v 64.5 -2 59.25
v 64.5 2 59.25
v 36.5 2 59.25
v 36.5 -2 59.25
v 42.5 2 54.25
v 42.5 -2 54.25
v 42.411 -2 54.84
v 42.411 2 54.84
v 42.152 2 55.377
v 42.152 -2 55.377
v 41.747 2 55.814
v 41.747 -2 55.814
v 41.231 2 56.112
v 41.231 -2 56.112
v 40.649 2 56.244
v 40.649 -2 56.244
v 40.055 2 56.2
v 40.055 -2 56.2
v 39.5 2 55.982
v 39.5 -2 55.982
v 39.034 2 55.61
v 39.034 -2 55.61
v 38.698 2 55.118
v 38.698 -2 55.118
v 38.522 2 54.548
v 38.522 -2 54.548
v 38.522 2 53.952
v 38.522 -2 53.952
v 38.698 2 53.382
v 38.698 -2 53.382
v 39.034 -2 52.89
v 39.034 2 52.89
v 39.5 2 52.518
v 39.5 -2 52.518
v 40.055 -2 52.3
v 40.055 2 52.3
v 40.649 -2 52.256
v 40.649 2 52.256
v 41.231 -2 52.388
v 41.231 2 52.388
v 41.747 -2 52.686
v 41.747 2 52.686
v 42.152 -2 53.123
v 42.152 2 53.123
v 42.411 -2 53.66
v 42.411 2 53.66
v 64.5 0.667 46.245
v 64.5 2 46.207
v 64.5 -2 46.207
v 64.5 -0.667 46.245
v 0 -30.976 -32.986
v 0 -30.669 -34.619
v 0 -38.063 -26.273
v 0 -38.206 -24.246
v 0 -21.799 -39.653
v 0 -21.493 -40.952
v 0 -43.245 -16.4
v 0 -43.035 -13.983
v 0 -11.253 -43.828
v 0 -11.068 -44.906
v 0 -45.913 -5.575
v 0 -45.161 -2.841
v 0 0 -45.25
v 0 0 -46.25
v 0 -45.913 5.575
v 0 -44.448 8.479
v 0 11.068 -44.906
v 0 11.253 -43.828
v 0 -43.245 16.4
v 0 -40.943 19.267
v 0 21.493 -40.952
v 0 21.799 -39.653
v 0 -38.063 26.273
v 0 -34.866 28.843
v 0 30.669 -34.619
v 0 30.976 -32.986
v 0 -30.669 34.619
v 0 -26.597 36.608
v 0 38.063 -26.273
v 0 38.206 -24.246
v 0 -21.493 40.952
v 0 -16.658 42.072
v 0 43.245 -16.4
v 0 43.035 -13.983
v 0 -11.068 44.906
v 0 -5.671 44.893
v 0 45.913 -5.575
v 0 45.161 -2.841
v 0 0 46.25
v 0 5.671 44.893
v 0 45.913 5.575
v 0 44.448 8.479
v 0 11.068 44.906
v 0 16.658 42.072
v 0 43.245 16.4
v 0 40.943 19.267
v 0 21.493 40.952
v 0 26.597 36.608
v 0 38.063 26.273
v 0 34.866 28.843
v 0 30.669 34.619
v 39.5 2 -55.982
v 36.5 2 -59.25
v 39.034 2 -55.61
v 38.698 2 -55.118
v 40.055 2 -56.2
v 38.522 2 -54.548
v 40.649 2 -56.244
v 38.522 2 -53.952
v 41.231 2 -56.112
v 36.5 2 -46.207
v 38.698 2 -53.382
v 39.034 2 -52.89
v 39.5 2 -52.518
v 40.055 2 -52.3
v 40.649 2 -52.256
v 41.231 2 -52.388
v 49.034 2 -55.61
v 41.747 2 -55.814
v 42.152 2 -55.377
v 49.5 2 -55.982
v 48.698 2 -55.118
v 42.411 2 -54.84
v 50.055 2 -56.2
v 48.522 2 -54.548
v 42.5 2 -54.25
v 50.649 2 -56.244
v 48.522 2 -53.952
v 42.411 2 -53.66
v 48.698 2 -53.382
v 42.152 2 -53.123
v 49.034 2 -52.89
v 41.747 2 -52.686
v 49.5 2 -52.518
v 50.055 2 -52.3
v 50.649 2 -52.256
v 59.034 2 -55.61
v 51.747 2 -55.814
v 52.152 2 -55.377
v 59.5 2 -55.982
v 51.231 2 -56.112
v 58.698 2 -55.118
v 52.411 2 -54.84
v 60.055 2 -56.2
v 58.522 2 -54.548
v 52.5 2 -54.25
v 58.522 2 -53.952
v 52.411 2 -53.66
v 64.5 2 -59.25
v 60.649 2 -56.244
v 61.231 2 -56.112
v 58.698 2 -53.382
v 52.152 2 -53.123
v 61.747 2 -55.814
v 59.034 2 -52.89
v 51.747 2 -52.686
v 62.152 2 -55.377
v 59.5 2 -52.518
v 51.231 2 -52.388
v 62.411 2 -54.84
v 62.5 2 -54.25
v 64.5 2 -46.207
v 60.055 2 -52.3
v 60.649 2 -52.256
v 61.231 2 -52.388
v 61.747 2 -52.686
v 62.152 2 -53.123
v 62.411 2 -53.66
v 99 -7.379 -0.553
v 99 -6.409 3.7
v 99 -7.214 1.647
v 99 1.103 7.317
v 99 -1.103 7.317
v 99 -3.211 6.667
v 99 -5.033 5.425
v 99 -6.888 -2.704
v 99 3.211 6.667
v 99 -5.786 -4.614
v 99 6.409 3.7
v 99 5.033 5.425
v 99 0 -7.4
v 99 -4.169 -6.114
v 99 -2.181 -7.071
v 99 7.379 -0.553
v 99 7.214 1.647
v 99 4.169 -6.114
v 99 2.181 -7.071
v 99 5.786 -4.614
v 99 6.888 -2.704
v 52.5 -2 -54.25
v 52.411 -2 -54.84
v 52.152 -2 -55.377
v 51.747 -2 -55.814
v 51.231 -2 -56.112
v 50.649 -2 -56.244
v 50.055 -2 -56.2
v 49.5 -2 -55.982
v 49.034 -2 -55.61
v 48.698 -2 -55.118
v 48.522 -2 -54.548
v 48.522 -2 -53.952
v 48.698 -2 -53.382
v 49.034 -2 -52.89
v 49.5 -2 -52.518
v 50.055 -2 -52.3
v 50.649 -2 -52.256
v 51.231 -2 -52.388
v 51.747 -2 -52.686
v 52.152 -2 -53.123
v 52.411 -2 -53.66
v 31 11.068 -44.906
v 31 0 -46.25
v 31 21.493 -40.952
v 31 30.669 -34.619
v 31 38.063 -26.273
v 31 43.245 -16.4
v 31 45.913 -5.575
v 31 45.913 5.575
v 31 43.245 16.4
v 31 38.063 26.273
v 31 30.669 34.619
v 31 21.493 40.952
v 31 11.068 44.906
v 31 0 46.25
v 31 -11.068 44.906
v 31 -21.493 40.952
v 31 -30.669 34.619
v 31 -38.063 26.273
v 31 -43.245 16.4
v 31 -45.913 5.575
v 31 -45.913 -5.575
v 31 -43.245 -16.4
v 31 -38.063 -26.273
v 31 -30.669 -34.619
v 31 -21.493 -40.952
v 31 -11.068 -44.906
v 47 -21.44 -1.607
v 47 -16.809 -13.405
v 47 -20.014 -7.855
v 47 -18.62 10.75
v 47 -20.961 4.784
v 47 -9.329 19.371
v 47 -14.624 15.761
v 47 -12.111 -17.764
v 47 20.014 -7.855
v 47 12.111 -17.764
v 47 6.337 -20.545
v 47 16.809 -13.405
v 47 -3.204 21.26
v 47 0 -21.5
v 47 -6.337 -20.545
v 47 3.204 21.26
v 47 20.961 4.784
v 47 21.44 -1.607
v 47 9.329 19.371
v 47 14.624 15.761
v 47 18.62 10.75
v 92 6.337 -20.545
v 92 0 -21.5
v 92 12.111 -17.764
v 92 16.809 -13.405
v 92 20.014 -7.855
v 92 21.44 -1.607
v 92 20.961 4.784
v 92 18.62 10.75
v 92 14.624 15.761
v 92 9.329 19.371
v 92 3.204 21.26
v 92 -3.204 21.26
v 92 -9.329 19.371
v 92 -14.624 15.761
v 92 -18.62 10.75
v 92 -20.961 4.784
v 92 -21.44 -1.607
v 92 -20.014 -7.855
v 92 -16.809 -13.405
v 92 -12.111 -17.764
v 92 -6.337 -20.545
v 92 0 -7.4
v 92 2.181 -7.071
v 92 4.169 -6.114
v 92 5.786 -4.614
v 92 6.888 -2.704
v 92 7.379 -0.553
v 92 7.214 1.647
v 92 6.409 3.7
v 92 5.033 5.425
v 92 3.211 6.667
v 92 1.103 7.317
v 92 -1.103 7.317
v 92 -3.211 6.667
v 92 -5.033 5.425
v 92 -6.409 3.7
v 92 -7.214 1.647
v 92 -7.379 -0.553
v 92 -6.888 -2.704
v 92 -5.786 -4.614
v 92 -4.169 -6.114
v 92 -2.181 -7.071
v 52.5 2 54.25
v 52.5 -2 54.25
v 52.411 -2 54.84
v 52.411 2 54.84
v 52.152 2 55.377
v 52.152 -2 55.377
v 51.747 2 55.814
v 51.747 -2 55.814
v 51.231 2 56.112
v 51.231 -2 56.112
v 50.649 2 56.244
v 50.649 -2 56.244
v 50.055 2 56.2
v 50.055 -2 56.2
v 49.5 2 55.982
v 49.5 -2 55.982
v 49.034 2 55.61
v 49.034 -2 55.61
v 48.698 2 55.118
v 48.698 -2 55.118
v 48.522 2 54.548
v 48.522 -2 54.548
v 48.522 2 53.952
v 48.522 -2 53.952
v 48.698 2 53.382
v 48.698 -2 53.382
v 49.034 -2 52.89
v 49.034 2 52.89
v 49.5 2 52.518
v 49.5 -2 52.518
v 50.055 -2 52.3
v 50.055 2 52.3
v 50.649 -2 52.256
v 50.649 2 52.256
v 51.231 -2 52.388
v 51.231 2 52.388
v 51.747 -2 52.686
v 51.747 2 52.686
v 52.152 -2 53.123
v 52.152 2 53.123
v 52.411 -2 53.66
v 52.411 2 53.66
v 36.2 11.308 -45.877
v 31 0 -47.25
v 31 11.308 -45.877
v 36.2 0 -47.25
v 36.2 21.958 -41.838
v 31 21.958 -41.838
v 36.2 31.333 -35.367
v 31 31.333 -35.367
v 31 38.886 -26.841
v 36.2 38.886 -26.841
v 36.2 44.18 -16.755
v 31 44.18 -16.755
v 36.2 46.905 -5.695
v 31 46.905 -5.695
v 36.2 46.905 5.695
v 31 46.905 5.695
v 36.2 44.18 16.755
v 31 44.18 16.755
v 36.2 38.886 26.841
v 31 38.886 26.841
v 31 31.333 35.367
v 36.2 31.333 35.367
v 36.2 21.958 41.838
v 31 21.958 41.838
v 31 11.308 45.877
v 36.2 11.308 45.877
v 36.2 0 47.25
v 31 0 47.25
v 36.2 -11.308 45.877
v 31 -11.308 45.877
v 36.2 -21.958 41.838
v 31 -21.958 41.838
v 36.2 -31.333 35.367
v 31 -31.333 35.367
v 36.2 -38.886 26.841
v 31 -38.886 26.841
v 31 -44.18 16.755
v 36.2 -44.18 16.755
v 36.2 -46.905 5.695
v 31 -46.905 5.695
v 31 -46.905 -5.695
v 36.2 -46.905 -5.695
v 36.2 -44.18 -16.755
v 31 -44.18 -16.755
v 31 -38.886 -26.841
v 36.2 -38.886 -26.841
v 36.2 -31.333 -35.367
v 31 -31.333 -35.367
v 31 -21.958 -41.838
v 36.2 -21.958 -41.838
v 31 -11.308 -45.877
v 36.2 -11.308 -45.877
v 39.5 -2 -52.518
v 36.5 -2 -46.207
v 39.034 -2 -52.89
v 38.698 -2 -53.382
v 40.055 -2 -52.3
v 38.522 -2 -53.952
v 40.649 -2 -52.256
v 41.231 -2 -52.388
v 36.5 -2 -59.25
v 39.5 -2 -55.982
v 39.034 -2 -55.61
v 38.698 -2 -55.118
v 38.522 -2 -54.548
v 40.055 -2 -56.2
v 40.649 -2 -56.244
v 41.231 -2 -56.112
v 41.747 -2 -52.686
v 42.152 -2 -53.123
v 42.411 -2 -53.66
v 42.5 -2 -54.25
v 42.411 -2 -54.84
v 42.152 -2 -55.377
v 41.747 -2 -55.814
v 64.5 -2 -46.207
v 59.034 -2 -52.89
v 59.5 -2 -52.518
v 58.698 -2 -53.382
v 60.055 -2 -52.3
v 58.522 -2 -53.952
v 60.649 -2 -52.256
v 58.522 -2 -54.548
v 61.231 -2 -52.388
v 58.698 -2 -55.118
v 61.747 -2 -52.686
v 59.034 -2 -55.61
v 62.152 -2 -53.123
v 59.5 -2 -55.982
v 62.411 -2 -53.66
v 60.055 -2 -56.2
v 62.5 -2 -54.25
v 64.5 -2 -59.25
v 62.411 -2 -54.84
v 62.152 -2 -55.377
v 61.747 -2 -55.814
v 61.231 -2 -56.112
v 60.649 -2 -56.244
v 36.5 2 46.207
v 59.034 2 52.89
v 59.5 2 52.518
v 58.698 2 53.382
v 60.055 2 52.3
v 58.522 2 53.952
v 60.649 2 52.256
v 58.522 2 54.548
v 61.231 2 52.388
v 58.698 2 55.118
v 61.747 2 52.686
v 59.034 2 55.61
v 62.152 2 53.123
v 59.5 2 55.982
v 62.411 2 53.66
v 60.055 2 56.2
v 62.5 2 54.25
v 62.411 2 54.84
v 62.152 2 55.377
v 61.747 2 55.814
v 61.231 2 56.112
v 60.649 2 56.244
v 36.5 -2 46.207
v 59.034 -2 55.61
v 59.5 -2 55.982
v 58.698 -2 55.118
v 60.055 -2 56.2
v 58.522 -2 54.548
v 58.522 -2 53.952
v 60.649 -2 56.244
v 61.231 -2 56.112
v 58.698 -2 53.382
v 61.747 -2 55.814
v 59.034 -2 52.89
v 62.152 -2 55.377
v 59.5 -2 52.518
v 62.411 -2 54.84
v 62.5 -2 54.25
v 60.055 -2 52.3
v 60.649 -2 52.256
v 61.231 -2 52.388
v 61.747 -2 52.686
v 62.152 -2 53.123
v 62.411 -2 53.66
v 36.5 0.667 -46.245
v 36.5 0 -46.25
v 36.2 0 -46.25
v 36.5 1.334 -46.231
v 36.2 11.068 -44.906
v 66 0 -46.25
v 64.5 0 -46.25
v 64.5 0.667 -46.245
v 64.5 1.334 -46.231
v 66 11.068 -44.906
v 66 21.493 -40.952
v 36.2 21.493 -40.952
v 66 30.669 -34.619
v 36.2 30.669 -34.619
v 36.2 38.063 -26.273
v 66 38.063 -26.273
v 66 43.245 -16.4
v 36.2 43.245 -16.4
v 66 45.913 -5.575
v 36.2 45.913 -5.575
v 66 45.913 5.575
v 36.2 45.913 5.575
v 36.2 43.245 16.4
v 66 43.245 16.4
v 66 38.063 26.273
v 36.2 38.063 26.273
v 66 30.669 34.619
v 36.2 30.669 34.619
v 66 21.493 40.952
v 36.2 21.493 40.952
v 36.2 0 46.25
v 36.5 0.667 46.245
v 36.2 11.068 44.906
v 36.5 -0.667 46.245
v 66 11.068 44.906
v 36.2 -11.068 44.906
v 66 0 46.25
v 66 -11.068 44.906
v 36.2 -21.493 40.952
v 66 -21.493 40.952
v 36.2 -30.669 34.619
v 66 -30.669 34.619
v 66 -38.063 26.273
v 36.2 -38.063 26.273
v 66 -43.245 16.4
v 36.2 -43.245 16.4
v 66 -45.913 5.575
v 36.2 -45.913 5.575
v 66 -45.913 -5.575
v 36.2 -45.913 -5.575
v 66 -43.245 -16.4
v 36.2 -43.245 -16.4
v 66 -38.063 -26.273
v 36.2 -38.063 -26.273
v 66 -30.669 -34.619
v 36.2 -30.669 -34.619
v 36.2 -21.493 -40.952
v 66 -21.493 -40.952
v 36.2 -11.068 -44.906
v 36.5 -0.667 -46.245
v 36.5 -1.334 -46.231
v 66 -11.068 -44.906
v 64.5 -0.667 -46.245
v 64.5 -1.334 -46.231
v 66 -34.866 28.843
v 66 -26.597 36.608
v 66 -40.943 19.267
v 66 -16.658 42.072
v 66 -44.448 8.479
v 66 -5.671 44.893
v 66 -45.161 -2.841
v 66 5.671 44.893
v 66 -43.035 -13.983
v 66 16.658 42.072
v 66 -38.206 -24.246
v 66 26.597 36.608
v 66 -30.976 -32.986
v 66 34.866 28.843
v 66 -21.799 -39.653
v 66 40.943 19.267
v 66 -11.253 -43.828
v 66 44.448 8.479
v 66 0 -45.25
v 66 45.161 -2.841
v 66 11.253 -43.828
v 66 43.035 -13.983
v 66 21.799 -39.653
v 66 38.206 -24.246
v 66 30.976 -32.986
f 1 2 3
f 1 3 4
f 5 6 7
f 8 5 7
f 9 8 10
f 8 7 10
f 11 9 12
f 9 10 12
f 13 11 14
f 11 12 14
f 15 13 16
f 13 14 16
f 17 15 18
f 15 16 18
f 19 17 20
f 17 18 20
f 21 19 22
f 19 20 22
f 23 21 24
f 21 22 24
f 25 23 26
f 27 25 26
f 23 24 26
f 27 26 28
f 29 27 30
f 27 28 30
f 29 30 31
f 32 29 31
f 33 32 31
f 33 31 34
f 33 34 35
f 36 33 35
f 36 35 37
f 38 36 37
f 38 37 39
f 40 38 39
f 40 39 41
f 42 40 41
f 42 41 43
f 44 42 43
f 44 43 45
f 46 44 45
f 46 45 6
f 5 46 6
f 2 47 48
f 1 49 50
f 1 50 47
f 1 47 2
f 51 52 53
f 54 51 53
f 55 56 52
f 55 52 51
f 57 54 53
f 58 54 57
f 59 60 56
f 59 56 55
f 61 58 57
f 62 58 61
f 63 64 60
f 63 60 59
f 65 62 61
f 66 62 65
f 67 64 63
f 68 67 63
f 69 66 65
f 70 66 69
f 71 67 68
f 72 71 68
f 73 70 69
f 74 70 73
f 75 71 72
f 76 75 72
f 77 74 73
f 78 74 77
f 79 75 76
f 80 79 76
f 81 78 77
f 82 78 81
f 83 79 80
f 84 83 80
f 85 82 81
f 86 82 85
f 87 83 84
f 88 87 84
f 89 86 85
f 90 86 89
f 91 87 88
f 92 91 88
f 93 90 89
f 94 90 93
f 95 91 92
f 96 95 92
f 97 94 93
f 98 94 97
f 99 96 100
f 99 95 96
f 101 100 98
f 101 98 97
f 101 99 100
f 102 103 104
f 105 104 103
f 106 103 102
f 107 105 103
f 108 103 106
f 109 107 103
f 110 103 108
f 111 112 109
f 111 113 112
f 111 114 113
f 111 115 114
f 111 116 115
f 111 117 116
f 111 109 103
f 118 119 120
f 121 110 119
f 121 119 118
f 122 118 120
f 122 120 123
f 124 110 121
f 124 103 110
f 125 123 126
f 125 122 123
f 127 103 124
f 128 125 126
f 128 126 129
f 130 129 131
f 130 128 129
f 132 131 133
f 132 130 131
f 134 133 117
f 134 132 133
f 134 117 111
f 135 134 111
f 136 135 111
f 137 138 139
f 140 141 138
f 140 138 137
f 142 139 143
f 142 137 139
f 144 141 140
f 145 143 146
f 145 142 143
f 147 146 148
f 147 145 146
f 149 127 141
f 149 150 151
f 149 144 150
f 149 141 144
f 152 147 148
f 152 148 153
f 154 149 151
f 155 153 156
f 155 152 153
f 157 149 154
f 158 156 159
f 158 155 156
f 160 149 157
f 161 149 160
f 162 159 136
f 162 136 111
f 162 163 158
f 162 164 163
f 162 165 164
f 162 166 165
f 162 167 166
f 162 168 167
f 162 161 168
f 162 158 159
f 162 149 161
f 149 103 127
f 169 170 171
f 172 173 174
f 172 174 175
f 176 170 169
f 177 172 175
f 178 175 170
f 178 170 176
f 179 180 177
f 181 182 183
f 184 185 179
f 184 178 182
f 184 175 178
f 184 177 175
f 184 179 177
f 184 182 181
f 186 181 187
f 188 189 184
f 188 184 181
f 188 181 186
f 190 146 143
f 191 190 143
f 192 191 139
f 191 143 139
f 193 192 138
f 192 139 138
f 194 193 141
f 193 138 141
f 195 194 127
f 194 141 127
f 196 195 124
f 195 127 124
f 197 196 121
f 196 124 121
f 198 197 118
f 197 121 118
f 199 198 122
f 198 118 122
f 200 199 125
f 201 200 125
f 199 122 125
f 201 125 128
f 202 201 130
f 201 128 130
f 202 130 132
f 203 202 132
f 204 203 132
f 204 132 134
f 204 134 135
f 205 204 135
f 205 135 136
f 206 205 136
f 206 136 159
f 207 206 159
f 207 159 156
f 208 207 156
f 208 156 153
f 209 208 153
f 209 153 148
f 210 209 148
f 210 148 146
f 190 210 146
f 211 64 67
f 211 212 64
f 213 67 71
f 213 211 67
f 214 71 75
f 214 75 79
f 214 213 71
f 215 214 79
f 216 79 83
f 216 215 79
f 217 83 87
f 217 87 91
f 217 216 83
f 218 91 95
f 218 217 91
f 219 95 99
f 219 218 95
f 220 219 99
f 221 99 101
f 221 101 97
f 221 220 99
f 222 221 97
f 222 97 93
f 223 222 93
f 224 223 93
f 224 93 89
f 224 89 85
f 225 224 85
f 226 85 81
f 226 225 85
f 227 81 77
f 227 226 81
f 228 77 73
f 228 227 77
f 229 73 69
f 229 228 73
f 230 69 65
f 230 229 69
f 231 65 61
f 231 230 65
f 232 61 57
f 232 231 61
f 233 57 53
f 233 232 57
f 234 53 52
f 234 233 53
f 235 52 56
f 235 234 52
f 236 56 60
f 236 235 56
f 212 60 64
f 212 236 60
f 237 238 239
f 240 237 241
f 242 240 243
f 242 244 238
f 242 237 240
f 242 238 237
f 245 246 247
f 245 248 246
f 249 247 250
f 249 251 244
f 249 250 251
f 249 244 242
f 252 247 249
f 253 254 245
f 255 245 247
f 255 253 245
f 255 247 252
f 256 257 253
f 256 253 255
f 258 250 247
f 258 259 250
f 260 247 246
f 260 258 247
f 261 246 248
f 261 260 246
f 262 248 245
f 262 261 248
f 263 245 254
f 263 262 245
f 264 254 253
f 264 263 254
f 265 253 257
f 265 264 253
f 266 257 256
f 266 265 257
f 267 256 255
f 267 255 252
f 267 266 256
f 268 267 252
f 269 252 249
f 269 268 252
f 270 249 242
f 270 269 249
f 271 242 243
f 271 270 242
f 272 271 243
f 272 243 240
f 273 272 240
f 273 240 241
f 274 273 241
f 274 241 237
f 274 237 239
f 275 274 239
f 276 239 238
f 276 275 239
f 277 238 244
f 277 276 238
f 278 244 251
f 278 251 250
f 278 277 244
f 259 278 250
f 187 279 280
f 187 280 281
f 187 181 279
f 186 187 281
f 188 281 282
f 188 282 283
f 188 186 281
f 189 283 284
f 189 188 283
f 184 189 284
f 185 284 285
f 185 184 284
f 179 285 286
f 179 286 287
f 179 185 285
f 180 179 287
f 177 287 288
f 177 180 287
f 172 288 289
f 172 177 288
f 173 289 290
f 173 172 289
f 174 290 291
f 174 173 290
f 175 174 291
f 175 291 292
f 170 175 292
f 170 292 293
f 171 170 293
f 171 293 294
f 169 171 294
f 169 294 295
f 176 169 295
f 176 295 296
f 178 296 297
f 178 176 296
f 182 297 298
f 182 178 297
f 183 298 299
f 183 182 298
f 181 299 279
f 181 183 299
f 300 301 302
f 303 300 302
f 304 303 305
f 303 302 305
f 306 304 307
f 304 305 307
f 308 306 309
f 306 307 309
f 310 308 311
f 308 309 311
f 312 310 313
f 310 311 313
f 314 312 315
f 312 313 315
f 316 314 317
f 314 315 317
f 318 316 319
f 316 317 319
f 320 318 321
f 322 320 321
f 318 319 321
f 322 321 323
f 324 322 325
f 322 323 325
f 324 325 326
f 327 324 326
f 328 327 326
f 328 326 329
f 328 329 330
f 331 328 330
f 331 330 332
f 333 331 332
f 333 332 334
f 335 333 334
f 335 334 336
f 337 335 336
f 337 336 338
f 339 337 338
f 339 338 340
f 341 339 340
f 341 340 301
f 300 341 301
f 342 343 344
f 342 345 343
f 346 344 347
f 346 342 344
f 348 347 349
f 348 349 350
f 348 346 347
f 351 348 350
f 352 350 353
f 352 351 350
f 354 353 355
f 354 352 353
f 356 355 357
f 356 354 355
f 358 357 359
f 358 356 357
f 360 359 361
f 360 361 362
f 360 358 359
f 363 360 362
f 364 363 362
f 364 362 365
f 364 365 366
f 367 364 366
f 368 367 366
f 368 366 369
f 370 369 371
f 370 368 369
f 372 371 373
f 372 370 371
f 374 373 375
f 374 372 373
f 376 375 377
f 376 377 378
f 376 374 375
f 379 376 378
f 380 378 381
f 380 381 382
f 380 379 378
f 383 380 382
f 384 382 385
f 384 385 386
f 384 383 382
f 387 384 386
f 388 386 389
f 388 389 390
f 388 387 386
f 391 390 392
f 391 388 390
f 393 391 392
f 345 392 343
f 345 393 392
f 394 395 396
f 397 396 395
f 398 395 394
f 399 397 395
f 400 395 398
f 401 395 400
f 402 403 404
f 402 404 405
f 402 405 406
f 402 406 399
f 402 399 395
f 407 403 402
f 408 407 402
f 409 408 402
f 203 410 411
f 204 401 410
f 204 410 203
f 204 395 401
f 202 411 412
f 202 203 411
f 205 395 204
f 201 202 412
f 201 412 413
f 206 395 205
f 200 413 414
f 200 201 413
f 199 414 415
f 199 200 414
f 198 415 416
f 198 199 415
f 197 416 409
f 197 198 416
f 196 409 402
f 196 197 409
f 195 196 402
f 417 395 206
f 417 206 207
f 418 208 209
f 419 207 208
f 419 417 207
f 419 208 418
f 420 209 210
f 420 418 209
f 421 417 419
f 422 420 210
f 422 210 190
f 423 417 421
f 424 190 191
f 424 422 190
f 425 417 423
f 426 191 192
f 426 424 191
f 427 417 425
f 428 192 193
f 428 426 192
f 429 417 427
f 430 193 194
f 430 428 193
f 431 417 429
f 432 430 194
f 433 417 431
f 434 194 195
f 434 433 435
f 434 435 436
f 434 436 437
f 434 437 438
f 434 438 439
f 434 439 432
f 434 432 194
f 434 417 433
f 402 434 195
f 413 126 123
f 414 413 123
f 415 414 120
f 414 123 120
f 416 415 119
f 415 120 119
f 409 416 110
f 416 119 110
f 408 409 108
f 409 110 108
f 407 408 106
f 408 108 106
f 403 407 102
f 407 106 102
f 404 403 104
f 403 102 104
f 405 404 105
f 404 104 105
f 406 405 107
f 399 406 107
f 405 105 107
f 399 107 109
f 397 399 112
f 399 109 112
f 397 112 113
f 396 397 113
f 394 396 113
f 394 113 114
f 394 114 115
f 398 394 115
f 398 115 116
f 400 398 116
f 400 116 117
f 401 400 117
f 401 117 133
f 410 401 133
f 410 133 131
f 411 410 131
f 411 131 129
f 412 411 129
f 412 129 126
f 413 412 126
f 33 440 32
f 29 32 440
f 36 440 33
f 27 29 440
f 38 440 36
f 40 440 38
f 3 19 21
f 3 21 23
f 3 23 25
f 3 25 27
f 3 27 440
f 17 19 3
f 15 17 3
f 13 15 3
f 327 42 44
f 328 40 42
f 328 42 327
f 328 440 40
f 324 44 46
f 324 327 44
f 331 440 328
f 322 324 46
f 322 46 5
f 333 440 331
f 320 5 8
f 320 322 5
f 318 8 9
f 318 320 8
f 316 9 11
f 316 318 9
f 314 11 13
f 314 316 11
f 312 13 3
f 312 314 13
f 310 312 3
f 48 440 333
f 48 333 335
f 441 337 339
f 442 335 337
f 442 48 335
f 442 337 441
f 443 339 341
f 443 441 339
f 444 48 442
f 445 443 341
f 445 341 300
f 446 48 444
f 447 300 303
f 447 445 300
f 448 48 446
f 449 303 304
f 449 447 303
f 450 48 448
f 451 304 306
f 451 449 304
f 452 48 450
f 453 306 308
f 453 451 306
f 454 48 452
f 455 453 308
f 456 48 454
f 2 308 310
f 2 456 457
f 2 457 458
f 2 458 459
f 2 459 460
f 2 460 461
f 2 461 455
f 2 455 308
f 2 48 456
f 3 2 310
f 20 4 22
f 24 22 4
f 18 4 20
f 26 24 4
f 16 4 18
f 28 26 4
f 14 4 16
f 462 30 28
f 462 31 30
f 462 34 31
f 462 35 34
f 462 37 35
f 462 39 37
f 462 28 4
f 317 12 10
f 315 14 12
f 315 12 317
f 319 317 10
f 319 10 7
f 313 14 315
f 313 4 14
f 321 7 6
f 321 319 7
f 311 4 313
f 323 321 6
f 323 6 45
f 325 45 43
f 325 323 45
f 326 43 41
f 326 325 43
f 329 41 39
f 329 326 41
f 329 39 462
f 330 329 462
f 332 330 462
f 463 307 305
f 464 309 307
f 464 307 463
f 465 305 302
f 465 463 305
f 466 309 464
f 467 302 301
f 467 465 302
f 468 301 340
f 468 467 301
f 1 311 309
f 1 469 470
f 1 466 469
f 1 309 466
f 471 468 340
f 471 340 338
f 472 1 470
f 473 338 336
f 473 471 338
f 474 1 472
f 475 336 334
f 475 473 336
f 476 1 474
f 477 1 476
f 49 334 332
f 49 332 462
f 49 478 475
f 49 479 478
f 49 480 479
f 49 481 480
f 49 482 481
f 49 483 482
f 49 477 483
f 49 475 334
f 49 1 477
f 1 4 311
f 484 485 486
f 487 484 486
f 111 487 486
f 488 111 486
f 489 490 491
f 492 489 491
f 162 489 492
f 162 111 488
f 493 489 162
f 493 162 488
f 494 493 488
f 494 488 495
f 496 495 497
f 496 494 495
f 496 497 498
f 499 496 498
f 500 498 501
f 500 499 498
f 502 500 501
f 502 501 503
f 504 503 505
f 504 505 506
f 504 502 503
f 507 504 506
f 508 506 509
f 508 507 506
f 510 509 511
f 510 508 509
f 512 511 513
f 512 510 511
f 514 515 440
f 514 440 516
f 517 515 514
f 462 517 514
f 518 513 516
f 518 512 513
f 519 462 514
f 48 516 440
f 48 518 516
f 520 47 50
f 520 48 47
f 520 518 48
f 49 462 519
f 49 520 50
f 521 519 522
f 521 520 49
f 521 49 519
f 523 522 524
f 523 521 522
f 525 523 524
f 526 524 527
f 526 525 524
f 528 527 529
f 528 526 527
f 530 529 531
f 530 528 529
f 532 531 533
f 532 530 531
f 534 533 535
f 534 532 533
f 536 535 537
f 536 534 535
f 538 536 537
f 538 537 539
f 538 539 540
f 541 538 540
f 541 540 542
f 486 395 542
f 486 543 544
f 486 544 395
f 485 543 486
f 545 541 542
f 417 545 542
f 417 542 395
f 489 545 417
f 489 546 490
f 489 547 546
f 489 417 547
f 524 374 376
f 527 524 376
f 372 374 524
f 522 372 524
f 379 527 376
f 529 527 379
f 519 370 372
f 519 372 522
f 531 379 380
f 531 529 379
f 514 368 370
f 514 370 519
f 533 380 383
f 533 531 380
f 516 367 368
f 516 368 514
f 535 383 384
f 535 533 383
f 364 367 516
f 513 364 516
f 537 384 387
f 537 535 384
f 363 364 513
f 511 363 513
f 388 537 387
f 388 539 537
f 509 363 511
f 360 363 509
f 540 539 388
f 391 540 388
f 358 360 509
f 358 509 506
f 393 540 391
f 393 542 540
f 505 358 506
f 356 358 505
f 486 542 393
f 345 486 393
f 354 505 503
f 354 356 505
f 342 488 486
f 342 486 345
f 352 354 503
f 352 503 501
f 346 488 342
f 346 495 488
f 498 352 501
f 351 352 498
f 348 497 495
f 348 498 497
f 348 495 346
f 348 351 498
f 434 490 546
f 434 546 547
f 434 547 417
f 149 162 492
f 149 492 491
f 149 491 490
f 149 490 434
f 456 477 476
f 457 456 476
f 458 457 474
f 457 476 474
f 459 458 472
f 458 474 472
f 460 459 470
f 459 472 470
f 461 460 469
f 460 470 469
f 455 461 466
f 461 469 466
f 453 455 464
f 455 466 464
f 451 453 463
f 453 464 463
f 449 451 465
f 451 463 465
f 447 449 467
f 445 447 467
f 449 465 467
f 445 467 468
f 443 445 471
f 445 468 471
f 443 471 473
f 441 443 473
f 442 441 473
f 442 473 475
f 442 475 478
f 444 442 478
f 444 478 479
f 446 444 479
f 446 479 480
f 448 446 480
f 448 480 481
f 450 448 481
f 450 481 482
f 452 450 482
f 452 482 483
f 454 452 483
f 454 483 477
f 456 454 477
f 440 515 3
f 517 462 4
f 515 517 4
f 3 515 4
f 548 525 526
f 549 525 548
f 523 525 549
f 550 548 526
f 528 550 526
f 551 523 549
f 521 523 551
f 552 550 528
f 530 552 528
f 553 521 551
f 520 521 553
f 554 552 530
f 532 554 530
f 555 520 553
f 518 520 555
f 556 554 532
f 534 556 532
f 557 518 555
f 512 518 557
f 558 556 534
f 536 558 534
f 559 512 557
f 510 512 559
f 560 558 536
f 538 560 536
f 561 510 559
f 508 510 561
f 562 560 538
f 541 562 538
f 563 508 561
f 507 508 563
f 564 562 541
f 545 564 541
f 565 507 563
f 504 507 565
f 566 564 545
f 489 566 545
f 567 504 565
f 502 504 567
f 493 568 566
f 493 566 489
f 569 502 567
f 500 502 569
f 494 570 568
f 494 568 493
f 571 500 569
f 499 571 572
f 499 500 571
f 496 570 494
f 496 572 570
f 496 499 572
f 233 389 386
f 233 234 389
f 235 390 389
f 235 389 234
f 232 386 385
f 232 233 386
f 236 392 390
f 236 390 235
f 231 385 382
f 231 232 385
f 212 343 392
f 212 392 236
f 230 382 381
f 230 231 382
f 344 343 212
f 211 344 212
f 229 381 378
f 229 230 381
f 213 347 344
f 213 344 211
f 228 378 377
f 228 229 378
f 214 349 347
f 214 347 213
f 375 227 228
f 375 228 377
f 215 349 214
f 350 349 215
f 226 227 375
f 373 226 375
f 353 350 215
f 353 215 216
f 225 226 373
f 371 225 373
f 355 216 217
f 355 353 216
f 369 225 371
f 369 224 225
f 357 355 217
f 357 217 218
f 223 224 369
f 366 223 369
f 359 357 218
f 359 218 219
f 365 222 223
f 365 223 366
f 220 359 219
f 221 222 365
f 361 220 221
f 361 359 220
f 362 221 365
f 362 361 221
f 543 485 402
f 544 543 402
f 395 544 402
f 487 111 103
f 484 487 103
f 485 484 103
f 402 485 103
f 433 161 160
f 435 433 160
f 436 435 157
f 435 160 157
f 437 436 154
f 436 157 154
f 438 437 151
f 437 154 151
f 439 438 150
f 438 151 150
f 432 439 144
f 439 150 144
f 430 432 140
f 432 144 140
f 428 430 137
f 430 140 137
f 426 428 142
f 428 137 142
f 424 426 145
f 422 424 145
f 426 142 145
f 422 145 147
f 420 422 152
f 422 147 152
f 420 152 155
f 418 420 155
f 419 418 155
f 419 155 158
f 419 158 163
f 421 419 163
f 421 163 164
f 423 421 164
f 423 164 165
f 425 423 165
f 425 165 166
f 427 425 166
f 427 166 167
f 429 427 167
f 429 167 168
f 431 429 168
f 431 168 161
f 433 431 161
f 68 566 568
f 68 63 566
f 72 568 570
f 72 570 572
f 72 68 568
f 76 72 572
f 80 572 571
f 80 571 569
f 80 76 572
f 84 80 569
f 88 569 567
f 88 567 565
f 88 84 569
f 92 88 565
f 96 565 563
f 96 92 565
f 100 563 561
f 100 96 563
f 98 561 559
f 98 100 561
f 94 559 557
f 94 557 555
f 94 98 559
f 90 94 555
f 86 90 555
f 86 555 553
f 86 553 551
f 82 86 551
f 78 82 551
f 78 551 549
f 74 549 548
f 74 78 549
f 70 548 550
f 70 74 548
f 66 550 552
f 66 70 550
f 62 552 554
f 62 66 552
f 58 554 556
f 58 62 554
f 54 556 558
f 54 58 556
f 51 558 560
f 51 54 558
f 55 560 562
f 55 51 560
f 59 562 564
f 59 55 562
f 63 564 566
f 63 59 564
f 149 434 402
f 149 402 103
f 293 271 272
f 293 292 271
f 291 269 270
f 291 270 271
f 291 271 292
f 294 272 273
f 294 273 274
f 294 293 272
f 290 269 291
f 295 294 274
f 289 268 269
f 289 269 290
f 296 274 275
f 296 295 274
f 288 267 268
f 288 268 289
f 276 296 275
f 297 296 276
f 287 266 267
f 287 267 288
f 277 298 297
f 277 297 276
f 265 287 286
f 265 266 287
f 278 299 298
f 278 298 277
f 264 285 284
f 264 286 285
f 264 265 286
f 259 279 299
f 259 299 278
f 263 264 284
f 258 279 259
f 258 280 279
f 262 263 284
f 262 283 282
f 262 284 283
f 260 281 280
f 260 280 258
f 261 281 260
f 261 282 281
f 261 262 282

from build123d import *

# Parameters (mm, degrees)
BOSS_EXTRUDE1_START = -1.5
BOSS_EXTRUDE1_DEPTH = 28
SKETCH3_R           = 2
CUT_EXTRUDE1_DEPTH  = 126.447698265
CIRPATTERN1_COUNT   = 2


with BuildPart() as part:
    # Sketch1 → Revolve1 (revolve)
    with BuildSketch(Plane(origin=(0, 0, 0), x_dir=(1, 0, 0), z_dir=(0, 1, 0))):
        Polygon((0, 45.25), (0, 46.25), (31, 46.25), (31, 47.25), (36.2, 47.25), (36.2, 46.25), (66, 46.25), (66, 45.25), align=None)
        Polygon((47, 21.5), (92, 21.5), (92, 7.4), (99, 7.4), (99, 0), (47, 0), align=None)
    revolve(axis=Axis((0, 0, 0), (1, 0, 0)))

    # Sketch2 → Boss-Extrude1 (add)
    with BuildSketch(Plane(origin=(66, 0, 0), x_dir=(0, 0, -1), z_dir=(1, 0, 0)).offset(BOSS_EXTRUDE1_START)):
        with BuildLine():
            Line((46.206736522, -2), (59.25, -2))
            Line((59.25, -2), (59.25, 2))
            Line((59.25, 2), (46.206736522, 2))
            ThreePointArc((46.206736522, 2), (46.25, 0), (46.206736522, -2))
        make_face()
    boss_extrude1 = extrude(amount=-BOSS_EXTRUDE1_DEPTH)

    # Sketch3 → Cut-Extrude1 (cut, through all)
    with BuildSketch(Plane(origin=(0, 2, 0), x_dir=(1, 0, 0), z_dir=(0, 1, 0))):
        with Locations((60.5, 54.25)):
            Circle(SKETCH3_R)
        with Locations((50.5, 54.25)):
            Circle(SKETCH3_R)
        with Locations((40.5, 54.25)):
            Circle(SKETCH3_R)
    cut_extrude1 = extrude(amount=-CUT_EXTRUDE1_DEPTH, mode=Mode.SUBTRACT)

    # CirPattern1: Boss-Extrude1, Cut-Extrude1 ×2 about axis
    cirpattern1_axis = Axis((173.098931414, 0, 0), (-1, 0, 0))
    add([boss_extrude1.rotate(cirpattern1_axis, i * 360 / CIRPATTERN1_COUNT) for i in range(1, CIRPATTERN1_COUNT)])
    add([cut_extrude1.rotate(cirpattern1_axis, i * 360 / CIRPATTERN1_COUNT) for i in range(1, CIRPATTERN1_COUNT)], mode=Mode.SUBTRACT)


solid = part.part
